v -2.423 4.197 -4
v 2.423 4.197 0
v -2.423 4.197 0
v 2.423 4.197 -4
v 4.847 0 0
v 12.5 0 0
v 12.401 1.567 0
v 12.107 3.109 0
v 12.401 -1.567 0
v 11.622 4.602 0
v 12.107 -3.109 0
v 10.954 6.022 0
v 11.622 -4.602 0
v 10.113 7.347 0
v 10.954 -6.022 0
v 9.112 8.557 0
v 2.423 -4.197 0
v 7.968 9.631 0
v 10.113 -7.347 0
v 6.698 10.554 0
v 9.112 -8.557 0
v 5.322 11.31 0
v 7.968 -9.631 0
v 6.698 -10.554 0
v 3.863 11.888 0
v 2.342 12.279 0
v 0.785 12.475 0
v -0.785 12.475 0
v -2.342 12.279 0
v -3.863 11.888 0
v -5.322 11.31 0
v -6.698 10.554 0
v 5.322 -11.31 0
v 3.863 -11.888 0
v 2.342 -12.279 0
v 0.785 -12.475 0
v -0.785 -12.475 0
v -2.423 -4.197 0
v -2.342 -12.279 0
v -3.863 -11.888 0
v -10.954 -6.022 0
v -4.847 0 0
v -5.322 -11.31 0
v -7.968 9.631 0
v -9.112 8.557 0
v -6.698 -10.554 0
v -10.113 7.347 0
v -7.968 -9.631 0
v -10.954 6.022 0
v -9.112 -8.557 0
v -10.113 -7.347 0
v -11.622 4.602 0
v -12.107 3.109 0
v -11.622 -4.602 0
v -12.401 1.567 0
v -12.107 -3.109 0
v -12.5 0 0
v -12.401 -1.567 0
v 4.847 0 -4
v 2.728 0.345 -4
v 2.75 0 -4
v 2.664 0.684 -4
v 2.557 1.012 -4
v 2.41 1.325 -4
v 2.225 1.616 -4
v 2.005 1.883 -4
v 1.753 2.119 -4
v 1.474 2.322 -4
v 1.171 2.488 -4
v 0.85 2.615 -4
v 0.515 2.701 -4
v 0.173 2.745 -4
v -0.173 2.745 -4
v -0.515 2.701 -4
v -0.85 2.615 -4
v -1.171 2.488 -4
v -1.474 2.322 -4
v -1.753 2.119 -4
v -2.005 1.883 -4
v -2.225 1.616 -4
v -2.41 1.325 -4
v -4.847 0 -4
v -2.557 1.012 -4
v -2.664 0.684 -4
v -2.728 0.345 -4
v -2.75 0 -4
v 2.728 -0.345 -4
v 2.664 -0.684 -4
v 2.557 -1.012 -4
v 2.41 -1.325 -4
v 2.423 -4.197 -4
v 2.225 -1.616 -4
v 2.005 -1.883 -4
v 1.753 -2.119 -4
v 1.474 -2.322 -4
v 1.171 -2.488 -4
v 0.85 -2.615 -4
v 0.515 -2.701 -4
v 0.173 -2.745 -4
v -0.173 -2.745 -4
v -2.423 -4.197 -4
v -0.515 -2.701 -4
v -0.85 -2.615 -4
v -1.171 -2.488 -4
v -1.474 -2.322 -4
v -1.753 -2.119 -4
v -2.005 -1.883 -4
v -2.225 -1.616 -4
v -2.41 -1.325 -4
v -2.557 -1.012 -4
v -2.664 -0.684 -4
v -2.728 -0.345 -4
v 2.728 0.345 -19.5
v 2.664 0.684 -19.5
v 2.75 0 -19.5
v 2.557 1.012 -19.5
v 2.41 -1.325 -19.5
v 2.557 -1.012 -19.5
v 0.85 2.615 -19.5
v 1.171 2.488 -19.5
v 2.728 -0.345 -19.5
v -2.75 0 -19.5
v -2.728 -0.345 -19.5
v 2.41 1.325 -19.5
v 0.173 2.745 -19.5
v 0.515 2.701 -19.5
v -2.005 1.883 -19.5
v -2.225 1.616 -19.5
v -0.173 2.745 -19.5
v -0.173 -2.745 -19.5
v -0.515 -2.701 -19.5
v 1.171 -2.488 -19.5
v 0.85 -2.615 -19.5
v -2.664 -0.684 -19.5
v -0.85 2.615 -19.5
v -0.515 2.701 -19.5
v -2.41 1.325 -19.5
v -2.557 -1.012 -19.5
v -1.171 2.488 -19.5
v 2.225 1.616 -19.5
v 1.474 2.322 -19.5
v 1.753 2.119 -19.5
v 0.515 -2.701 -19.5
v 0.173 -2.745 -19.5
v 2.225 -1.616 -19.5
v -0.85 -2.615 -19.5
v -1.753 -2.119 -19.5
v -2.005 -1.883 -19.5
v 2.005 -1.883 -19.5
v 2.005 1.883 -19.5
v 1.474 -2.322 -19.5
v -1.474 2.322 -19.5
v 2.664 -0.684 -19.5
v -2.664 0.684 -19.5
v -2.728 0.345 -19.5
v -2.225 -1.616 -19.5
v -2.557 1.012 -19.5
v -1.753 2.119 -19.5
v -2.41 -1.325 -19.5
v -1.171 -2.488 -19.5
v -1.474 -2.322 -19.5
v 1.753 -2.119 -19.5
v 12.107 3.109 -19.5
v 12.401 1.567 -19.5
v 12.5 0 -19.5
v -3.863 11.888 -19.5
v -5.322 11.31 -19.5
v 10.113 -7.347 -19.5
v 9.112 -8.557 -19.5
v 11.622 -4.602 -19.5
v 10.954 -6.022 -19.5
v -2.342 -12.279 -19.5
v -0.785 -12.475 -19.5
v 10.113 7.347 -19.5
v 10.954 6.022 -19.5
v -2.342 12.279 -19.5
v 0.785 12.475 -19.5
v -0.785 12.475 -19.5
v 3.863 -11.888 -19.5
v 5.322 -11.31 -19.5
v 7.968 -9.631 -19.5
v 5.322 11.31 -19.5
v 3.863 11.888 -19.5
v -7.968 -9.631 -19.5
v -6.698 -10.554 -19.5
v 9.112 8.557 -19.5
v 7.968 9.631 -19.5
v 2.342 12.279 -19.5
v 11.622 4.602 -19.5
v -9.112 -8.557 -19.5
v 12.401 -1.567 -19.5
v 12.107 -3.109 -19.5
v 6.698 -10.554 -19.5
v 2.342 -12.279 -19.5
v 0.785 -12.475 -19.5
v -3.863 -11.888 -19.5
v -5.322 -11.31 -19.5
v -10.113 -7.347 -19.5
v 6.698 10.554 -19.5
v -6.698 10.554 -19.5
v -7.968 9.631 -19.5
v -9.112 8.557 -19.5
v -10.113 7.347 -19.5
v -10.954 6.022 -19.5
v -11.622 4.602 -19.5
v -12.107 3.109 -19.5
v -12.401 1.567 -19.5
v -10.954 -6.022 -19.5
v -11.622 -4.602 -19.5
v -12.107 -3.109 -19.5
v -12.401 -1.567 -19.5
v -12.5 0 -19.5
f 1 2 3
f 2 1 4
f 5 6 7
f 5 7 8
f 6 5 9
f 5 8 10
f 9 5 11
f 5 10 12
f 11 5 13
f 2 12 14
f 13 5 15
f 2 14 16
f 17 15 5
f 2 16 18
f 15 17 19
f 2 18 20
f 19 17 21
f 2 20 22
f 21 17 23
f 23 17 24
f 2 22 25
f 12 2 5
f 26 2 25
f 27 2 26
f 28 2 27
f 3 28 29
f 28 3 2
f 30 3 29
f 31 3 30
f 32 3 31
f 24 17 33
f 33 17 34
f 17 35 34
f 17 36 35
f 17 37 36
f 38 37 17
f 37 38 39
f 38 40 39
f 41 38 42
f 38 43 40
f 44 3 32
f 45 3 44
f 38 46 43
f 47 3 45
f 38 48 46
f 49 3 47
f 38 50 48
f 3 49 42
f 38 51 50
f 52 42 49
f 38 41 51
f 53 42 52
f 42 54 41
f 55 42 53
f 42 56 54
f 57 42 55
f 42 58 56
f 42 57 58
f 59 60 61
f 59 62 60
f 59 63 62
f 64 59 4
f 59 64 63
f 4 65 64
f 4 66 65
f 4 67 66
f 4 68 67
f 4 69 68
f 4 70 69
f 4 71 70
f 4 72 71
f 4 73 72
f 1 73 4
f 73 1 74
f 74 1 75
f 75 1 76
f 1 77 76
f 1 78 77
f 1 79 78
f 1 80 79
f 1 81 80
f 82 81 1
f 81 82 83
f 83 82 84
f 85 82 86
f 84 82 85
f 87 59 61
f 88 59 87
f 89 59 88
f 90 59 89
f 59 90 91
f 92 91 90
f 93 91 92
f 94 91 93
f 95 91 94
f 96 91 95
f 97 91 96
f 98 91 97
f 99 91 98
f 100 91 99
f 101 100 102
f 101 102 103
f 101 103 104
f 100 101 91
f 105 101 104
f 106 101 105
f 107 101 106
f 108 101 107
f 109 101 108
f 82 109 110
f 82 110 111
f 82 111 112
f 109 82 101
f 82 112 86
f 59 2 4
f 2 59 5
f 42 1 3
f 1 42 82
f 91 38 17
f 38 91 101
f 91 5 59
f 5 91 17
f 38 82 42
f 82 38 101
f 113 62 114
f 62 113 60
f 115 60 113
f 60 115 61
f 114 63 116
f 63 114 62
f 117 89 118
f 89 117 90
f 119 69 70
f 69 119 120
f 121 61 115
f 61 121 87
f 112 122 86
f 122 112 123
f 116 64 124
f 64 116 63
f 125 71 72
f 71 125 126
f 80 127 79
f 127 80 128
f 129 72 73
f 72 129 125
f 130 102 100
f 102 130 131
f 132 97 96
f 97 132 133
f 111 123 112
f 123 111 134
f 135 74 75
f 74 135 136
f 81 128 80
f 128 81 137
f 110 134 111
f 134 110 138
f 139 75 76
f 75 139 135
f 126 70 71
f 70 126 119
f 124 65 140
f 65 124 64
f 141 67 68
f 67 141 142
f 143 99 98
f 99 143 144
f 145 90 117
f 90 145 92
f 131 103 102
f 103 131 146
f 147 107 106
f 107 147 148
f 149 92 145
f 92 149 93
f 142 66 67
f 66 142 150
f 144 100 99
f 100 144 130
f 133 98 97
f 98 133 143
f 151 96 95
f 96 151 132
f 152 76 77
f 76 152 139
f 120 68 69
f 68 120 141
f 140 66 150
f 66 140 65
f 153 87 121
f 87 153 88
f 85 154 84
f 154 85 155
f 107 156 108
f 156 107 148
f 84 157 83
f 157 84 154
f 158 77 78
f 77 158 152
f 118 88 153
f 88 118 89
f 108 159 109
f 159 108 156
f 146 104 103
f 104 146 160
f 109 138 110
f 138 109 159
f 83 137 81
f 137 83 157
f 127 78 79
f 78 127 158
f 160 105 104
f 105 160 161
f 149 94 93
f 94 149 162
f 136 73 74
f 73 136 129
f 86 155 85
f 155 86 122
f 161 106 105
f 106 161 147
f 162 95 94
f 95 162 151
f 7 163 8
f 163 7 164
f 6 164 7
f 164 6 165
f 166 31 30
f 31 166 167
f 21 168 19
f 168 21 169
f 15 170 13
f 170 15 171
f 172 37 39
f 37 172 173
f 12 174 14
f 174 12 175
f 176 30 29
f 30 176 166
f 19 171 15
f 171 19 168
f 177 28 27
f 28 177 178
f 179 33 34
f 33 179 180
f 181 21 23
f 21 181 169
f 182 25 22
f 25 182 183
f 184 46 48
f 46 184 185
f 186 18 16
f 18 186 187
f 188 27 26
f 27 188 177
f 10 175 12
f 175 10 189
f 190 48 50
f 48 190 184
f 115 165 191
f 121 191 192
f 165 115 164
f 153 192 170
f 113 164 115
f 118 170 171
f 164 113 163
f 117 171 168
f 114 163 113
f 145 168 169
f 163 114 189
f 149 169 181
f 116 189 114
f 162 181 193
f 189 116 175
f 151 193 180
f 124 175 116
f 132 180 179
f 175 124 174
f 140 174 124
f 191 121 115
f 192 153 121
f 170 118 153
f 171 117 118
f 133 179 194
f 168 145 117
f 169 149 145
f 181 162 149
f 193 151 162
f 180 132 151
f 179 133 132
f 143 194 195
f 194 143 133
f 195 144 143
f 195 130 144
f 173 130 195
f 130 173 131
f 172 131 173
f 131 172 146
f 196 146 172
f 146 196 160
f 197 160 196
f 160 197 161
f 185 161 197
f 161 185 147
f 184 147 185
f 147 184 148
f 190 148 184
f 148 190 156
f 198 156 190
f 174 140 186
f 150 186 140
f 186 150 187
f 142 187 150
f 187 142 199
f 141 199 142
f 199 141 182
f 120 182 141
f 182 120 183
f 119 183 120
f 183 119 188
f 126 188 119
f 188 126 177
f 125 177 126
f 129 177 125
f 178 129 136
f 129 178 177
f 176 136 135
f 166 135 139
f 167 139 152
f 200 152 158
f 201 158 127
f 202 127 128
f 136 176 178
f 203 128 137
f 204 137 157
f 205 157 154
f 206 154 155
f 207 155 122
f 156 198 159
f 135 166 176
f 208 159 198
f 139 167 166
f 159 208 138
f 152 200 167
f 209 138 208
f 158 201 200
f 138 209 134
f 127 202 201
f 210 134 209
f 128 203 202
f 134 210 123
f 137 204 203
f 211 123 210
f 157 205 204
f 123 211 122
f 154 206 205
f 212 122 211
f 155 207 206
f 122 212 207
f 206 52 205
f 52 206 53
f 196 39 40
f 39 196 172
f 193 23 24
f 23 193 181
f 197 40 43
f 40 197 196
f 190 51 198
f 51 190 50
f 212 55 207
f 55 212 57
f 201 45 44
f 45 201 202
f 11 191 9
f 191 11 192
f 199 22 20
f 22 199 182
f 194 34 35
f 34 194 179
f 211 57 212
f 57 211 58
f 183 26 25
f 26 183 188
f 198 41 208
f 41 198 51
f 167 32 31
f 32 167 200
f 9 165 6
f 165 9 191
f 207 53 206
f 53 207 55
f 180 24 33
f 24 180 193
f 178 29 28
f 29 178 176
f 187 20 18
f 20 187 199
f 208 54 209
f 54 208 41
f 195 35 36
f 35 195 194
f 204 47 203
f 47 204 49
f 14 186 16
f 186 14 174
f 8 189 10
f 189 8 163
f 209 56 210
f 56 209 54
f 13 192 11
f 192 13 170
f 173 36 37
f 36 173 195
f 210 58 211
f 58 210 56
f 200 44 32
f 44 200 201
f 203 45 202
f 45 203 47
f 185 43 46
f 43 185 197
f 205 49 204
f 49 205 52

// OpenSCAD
$fn = 50;


difference() {
	union() {
		translate(v = [0, 0, -19.5000000000]) {
			cylinder(h = 19.5000000000, r = 12.5000000000);
		}
	}
	union() {
		translate(v = [0, 0, 0]) {
			rotate(a = [0, 0, 0]) {
				difference() {
					union() {
						translate(v = [0, 0, -4]) {
							linear_extrude(height = 4) {
								polygon(points = [[4.8468000000, 0.0000000000], [2.4234000000, 4.1974519271], [-2.4234000000, 4.1974519271], [-4.8468000000, 0.0000000000], [-2.4234000000, -4.1974519271], [2.4234000000, -4.1974519271]]);
							}
						}
					}
					union();
				}
			}
		}
		#translate(v = [0, 0, -100.0000000000]) {
			cylinder(h = 200, r = 2.7500000000);
		}
	}
}
